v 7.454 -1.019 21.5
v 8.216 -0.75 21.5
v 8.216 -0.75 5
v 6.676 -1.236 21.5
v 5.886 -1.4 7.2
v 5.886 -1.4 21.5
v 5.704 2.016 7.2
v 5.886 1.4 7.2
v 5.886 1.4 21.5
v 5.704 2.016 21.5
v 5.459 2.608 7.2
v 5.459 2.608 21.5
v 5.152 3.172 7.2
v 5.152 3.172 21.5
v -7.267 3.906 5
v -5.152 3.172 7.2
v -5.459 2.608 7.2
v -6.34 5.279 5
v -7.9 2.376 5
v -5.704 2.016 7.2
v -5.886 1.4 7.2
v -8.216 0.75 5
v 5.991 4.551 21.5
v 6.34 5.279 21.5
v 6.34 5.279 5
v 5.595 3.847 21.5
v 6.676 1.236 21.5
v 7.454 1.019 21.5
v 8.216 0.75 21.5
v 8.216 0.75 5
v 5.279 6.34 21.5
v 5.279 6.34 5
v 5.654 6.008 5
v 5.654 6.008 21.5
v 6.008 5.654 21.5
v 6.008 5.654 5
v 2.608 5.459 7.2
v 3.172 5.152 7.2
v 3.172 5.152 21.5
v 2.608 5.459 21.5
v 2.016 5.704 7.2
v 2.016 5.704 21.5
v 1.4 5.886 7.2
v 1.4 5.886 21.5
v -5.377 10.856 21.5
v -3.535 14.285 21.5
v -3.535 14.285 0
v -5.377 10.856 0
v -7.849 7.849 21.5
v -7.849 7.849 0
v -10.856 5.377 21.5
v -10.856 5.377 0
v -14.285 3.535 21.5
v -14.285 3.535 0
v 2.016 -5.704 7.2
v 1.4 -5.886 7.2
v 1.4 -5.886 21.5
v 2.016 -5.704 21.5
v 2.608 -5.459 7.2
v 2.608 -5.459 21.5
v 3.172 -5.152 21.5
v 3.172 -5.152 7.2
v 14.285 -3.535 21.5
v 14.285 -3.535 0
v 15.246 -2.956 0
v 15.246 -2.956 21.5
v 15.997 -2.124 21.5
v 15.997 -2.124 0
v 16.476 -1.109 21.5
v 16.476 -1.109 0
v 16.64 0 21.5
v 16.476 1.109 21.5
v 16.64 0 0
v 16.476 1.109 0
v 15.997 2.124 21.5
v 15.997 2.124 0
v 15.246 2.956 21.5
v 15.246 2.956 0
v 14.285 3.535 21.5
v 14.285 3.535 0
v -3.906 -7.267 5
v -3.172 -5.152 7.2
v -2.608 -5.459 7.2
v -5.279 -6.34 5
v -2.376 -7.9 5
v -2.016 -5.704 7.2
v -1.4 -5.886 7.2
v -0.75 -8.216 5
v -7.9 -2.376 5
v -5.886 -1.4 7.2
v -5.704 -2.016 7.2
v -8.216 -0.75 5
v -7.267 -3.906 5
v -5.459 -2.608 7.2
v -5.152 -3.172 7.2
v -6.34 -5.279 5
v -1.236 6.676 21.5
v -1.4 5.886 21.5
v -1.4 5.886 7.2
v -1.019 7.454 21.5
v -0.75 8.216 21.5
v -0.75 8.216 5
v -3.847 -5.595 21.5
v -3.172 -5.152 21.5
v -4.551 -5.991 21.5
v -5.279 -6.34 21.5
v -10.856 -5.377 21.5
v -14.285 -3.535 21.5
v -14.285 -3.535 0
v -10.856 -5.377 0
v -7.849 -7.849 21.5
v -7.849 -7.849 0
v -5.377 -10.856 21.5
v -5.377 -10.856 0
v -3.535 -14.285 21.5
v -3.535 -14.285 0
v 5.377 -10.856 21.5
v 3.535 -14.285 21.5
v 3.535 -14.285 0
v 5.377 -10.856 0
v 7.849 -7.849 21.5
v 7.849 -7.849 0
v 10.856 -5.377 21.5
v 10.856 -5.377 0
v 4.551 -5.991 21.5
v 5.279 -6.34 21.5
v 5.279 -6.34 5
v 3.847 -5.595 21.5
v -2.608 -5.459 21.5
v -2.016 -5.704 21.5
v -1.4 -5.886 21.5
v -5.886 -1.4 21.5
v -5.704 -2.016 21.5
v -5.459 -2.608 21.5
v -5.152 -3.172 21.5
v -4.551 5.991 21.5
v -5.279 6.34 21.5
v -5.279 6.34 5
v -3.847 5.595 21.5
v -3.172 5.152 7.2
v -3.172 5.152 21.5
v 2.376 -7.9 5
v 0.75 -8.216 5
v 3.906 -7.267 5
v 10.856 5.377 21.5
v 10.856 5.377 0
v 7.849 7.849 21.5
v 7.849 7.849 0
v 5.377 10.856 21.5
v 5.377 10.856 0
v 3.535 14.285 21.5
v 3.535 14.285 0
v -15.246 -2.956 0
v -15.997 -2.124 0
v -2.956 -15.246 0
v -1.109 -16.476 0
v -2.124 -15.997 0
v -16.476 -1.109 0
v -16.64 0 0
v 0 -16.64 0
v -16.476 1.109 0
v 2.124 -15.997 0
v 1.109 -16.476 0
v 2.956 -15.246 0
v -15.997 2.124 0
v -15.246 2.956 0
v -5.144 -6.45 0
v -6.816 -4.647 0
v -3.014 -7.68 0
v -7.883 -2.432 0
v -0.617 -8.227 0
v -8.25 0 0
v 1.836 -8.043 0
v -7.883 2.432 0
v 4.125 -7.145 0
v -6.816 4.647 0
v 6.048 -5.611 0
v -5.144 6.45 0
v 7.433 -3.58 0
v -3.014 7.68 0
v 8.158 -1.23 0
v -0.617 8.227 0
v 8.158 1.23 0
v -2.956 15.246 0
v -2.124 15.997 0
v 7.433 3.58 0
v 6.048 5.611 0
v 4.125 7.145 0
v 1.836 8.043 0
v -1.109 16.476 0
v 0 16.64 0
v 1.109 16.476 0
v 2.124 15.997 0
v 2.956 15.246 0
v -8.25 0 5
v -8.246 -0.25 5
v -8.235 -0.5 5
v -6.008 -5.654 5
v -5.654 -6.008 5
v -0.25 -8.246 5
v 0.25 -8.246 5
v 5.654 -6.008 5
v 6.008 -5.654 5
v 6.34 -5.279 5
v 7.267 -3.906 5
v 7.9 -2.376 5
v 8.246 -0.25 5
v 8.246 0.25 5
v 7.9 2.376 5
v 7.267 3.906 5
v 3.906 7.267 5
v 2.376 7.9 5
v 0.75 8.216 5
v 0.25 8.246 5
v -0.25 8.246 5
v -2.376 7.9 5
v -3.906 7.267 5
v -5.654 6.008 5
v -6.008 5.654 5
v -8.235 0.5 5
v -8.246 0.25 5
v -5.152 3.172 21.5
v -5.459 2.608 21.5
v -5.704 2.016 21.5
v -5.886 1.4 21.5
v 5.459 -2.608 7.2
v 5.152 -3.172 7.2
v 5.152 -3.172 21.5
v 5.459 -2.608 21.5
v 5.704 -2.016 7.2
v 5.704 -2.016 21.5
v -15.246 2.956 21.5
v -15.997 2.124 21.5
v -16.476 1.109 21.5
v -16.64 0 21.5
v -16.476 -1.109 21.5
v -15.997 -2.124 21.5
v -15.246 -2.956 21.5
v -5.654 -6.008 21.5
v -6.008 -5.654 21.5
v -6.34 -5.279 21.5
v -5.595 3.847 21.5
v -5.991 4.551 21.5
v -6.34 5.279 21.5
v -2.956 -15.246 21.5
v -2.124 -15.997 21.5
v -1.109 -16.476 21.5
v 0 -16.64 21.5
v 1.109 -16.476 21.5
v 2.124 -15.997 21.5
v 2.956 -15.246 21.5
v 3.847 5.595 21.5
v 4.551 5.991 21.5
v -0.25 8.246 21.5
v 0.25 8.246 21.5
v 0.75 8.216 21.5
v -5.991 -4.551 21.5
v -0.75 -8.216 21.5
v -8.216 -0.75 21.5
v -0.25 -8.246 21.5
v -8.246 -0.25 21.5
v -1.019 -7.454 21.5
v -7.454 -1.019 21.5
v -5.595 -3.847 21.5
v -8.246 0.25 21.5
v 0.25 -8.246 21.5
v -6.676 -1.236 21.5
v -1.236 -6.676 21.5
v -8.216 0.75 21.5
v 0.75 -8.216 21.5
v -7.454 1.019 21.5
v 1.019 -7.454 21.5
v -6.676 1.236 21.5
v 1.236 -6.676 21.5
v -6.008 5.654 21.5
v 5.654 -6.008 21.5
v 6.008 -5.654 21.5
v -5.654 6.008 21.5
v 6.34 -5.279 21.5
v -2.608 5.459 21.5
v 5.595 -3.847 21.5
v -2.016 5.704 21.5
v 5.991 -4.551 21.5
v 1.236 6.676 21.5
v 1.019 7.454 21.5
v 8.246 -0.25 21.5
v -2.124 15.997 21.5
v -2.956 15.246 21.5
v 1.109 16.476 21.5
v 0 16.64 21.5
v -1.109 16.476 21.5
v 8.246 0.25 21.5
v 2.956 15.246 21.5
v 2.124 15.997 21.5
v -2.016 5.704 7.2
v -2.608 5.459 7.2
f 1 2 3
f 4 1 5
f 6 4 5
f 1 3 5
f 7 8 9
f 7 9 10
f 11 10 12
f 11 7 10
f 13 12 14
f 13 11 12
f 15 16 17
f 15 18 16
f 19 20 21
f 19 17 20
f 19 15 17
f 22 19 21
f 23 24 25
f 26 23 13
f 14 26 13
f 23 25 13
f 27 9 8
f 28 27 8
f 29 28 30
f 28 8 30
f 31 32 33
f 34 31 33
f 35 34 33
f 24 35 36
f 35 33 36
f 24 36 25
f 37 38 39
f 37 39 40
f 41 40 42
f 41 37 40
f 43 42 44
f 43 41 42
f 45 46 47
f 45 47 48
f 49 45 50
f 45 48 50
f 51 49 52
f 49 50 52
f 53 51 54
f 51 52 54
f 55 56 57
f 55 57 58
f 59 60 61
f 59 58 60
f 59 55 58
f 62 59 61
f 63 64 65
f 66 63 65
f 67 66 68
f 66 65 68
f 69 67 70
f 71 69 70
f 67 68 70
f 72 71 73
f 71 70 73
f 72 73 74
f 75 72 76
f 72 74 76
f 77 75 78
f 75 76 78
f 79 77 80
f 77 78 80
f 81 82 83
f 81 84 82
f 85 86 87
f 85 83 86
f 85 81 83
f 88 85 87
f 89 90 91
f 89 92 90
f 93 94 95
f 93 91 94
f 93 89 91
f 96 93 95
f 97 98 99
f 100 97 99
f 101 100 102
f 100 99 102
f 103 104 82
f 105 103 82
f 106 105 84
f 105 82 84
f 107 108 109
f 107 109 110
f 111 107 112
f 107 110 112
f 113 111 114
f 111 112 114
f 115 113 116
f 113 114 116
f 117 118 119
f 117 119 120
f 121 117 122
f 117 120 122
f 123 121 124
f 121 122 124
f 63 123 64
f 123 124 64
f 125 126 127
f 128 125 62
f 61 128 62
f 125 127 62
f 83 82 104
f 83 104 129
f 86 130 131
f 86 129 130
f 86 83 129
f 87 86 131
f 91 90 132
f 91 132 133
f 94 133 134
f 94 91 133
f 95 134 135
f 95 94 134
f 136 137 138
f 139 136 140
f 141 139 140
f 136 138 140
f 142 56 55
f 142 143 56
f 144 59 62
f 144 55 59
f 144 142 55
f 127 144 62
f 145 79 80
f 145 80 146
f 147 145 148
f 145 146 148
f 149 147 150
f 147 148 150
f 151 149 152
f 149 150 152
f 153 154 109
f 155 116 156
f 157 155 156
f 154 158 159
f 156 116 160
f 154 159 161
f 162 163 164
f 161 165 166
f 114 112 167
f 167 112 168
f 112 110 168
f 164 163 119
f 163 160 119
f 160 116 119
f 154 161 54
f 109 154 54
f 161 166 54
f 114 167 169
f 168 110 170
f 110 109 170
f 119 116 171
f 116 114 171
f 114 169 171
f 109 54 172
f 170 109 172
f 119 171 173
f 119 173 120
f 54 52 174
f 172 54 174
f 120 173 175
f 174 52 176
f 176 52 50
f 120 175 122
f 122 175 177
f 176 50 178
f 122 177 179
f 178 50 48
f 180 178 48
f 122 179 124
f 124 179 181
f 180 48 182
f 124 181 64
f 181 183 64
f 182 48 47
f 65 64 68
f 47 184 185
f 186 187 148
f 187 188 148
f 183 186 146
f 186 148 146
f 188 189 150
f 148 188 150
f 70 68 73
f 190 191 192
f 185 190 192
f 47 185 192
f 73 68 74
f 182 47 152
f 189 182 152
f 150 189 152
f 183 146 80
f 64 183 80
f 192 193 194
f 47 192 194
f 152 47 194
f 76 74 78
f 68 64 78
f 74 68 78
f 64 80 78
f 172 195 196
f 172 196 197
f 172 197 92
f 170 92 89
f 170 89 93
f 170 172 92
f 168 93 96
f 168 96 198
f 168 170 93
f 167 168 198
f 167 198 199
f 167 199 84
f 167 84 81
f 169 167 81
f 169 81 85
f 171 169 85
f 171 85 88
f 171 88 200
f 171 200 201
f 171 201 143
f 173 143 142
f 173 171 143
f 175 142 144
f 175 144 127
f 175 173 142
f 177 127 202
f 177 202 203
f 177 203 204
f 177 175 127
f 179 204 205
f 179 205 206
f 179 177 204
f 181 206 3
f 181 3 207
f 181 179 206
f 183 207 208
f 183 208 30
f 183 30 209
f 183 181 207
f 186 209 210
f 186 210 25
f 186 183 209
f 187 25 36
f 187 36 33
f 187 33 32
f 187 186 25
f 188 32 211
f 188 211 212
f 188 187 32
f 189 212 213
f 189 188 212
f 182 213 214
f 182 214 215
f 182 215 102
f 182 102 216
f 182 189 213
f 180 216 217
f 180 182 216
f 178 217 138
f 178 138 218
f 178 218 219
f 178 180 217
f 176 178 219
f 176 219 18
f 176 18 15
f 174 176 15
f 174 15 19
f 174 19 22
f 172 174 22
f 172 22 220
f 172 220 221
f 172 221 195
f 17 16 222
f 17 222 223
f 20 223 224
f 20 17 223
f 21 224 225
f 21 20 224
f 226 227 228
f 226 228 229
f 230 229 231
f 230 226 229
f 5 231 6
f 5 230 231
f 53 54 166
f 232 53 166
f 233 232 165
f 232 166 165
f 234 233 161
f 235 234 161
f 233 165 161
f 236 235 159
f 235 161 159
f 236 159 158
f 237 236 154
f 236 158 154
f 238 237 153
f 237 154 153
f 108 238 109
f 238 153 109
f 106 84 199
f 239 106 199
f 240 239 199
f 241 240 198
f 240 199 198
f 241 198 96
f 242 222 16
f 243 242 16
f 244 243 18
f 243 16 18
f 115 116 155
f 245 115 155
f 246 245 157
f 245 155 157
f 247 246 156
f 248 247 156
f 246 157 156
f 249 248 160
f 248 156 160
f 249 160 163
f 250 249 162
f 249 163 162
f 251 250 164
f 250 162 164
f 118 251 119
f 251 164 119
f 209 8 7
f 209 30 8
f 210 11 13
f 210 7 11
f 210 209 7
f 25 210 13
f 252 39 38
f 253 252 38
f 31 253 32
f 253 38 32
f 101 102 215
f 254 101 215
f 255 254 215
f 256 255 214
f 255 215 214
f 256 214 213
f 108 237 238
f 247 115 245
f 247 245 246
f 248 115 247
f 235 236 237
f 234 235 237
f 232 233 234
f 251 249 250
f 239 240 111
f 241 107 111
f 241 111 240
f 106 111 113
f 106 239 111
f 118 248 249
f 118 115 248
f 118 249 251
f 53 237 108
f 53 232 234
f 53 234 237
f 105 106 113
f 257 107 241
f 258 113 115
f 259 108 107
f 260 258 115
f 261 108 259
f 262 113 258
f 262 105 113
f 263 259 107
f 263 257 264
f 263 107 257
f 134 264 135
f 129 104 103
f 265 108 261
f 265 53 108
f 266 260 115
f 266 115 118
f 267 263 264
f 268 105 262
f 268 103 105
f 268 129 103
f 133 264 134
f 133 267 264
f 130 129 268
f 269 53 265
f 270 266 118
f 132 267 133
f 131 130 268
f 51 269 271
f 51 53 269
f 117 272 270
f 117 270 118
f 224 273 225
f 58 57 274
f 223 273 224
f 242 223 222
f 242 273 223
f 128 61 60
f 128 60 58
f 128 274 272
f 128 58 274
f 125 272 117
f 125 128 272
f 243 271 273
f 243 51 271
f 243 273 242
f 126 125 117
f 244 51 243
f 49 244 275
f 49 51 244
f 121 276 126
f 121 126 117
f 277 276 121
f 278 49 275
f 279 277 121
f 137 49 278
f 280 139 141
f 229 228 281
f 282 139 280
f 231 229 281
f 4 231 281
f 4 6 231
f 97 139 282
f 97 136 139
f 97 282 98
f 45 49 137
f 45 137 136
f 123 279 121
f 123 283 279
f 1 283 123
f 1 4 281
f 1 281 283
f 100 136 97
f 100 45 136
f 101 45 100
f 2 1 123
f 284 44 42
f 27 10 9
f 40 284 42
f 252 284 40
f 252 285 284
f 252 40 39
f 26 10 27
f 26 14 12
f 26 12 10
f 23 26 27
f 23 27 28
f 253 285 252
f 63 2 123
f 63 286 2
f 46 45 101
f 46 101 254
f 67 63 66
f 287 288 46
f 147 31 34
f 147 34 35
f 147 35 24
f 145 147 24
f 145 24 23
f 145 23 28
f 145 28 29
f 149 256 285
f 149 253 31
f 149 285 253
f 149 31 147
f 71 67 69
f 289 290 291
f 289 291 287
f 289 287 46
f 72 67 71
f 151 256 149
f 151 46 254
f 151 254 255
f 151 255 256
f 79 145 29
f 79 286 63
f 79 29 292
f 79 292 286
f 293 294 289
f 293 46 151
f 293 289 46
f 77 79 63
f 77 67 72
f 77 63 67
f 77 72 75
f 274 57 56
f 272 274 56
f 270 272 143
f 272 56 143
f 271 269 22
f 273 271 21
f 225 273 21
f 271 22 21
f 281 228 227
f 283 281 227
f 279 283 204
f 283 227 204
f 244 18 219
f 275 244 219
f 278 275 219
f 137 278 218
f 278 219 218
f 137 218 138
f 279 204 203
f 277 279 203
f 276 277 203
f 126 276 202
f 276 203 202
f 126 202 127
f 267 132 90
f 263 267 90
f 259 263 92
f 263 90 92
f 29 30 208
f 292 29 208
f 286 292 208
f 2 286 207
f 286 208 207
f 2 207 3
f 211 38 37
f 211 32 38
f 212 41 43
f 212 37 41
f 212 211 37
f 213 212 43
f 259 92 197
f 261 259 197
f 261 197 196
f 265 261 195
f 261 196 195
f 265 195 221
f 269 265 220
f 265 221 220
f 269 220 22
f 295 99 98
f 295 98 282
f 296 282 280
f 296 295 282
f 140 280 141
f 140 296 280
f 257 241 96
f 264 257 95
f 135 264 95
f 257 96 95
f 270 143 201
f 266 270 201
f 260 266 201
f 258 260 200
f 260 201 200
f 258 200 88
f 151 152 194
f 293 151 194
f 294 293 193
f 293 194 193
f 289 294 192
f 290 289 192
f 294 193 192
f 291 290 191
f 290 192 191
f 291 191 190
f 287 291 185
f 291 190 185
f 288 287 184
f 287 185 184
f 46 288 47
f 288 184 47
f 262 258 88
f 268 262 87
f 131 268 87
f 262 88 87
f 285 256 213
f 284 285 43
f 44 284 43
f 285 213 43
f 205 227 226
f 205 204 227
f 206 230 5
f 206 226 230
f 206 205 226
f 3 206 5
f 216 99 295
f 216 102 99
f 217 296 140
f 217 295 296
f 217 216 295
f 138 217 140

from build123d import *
from build123d.topology import SkipClean

# Parameters (mm, degrees)
SKETCH1_R         = 6
EXTRUDE1_DEPTH    = 21.5
EXTRUDE2_REACH    = 33.875
CIRPATTERN1_COUNT = 8


with BuildPart() as part:
    # Sketch1 → Extrude1 (new body)
    with BuildSketch(Plane.XY):
        with BuildLine():
            ThreePointArc((3.535156209, 14.285110262), (0, 16.64), (-3.535156209, 14.285110262))
            ThreePointArc((-3.535156209, 14.285110262), (-7.848885271, 7.848885271), (-14.285110262, 3.535156209))
            ThreePointArc((-14.285110262, 3.535156209), (-16.64, 0), (-14.285110262, -3.535156209))
            ThreePointArc((-14.285110262, -3.535156209), (-7.848885271, -7.848885271), (-3.535156209, -14.285110262))
            ThreePointArc((-3.535156209, -14.285110262), (0, -16.64), (3.535156209, -14.285110262))
            ThreePointArc((3.535156209, -14.285110262), (7.848885271, -7.848885271), (14.285110262, -3.535156209))
            ThreePointArc((14.285110262, -3.535156209), (16.64, 0), (14.285110262, 3.535156209))
            ThreePointArc((14.285110262, 3.535156209), (7.848885271, 7.848885271), (3.535156209, 14.285110262))
        make_face()
        Circle(SKETCH1_R, mode=Mode.SUBTRACT)
    extrude(amount=EXTRUDE1_DEPTH)

    # Sketch4 → Cut-Revolve1 (revolve, cut)
    with BuildSketch(Plane(origin=(0, 0, 0), x_dir=(0, 0, -1), z_dir=(1, 0, 0)), mode=Mode.PRIVATE) as cut_revolve1_sk:
        Polygon((0, 0), (-21.5, 0), (-21.5, 6.05), (-7.2, 6.05), (-5, 8.25), (0, 8.25), align=None)
    revolve(cut_revolve1_sk.sketch.rotate(Axis((0, 0, 0), (0, 0, 1)), 90), axis=Axis((0, 0, 0), (0, 0, 1)), mode=Mode.SUBTRACT)

    # Sketch2 → Extrude2 (cut, up to next)
    with BuildSketch(Plane(origin=(0, 0, 0), x_dir=(-1, 0, 0), z_dir=(0, 0, -1)), mode=Mode.PRIVATE) as extrude2_sk1:
        with BuildLine():
            ThreePointArc((0.75, 8.215838363), (0, 8.25), (-0.75, 8.215838363))
            ThreePointArc((-0.75, 8.215838363), (-1.133672744, 7.067180744), (-1.4, 5.885787968))
            ThreePointArc((-1.4, 5.885787968), (0, 6.05), (1.4, 5.885787968))
            ThreePointArc((1.4, 5.885787968), (1.133672744, 7.067180744), (0.75, 8.215838363))
        make_face()
    extrude2_tool1 = extrude(extrude2_sk1.sketch, amount=-EXTRUDE2_REACH, mode=Mode.PRIVATE) & part.part
    extrude2 = extrude2_tool1.solids().sort_by_distance((0, 7.008505, 0))[0]
    add(extrude2, mode=Mode.SUBTRACT)

    # CirPattern1: Extrude2 ×8 about axis
    with SkipClean():  # the faces are left unmerged after this step: merging them gives an invalid solid
        cirpattern1_axis = Axis((0, 0, 0), (0, 0, 1))
        for i in range(1, CIRPATTERN1_COUNT):
            add(extrude2.rotate(cirpattern1_axis, i * 360 / CIRPATTERN1_COUNT), mode=Mode.SUBTRACT)


solid = part.part
